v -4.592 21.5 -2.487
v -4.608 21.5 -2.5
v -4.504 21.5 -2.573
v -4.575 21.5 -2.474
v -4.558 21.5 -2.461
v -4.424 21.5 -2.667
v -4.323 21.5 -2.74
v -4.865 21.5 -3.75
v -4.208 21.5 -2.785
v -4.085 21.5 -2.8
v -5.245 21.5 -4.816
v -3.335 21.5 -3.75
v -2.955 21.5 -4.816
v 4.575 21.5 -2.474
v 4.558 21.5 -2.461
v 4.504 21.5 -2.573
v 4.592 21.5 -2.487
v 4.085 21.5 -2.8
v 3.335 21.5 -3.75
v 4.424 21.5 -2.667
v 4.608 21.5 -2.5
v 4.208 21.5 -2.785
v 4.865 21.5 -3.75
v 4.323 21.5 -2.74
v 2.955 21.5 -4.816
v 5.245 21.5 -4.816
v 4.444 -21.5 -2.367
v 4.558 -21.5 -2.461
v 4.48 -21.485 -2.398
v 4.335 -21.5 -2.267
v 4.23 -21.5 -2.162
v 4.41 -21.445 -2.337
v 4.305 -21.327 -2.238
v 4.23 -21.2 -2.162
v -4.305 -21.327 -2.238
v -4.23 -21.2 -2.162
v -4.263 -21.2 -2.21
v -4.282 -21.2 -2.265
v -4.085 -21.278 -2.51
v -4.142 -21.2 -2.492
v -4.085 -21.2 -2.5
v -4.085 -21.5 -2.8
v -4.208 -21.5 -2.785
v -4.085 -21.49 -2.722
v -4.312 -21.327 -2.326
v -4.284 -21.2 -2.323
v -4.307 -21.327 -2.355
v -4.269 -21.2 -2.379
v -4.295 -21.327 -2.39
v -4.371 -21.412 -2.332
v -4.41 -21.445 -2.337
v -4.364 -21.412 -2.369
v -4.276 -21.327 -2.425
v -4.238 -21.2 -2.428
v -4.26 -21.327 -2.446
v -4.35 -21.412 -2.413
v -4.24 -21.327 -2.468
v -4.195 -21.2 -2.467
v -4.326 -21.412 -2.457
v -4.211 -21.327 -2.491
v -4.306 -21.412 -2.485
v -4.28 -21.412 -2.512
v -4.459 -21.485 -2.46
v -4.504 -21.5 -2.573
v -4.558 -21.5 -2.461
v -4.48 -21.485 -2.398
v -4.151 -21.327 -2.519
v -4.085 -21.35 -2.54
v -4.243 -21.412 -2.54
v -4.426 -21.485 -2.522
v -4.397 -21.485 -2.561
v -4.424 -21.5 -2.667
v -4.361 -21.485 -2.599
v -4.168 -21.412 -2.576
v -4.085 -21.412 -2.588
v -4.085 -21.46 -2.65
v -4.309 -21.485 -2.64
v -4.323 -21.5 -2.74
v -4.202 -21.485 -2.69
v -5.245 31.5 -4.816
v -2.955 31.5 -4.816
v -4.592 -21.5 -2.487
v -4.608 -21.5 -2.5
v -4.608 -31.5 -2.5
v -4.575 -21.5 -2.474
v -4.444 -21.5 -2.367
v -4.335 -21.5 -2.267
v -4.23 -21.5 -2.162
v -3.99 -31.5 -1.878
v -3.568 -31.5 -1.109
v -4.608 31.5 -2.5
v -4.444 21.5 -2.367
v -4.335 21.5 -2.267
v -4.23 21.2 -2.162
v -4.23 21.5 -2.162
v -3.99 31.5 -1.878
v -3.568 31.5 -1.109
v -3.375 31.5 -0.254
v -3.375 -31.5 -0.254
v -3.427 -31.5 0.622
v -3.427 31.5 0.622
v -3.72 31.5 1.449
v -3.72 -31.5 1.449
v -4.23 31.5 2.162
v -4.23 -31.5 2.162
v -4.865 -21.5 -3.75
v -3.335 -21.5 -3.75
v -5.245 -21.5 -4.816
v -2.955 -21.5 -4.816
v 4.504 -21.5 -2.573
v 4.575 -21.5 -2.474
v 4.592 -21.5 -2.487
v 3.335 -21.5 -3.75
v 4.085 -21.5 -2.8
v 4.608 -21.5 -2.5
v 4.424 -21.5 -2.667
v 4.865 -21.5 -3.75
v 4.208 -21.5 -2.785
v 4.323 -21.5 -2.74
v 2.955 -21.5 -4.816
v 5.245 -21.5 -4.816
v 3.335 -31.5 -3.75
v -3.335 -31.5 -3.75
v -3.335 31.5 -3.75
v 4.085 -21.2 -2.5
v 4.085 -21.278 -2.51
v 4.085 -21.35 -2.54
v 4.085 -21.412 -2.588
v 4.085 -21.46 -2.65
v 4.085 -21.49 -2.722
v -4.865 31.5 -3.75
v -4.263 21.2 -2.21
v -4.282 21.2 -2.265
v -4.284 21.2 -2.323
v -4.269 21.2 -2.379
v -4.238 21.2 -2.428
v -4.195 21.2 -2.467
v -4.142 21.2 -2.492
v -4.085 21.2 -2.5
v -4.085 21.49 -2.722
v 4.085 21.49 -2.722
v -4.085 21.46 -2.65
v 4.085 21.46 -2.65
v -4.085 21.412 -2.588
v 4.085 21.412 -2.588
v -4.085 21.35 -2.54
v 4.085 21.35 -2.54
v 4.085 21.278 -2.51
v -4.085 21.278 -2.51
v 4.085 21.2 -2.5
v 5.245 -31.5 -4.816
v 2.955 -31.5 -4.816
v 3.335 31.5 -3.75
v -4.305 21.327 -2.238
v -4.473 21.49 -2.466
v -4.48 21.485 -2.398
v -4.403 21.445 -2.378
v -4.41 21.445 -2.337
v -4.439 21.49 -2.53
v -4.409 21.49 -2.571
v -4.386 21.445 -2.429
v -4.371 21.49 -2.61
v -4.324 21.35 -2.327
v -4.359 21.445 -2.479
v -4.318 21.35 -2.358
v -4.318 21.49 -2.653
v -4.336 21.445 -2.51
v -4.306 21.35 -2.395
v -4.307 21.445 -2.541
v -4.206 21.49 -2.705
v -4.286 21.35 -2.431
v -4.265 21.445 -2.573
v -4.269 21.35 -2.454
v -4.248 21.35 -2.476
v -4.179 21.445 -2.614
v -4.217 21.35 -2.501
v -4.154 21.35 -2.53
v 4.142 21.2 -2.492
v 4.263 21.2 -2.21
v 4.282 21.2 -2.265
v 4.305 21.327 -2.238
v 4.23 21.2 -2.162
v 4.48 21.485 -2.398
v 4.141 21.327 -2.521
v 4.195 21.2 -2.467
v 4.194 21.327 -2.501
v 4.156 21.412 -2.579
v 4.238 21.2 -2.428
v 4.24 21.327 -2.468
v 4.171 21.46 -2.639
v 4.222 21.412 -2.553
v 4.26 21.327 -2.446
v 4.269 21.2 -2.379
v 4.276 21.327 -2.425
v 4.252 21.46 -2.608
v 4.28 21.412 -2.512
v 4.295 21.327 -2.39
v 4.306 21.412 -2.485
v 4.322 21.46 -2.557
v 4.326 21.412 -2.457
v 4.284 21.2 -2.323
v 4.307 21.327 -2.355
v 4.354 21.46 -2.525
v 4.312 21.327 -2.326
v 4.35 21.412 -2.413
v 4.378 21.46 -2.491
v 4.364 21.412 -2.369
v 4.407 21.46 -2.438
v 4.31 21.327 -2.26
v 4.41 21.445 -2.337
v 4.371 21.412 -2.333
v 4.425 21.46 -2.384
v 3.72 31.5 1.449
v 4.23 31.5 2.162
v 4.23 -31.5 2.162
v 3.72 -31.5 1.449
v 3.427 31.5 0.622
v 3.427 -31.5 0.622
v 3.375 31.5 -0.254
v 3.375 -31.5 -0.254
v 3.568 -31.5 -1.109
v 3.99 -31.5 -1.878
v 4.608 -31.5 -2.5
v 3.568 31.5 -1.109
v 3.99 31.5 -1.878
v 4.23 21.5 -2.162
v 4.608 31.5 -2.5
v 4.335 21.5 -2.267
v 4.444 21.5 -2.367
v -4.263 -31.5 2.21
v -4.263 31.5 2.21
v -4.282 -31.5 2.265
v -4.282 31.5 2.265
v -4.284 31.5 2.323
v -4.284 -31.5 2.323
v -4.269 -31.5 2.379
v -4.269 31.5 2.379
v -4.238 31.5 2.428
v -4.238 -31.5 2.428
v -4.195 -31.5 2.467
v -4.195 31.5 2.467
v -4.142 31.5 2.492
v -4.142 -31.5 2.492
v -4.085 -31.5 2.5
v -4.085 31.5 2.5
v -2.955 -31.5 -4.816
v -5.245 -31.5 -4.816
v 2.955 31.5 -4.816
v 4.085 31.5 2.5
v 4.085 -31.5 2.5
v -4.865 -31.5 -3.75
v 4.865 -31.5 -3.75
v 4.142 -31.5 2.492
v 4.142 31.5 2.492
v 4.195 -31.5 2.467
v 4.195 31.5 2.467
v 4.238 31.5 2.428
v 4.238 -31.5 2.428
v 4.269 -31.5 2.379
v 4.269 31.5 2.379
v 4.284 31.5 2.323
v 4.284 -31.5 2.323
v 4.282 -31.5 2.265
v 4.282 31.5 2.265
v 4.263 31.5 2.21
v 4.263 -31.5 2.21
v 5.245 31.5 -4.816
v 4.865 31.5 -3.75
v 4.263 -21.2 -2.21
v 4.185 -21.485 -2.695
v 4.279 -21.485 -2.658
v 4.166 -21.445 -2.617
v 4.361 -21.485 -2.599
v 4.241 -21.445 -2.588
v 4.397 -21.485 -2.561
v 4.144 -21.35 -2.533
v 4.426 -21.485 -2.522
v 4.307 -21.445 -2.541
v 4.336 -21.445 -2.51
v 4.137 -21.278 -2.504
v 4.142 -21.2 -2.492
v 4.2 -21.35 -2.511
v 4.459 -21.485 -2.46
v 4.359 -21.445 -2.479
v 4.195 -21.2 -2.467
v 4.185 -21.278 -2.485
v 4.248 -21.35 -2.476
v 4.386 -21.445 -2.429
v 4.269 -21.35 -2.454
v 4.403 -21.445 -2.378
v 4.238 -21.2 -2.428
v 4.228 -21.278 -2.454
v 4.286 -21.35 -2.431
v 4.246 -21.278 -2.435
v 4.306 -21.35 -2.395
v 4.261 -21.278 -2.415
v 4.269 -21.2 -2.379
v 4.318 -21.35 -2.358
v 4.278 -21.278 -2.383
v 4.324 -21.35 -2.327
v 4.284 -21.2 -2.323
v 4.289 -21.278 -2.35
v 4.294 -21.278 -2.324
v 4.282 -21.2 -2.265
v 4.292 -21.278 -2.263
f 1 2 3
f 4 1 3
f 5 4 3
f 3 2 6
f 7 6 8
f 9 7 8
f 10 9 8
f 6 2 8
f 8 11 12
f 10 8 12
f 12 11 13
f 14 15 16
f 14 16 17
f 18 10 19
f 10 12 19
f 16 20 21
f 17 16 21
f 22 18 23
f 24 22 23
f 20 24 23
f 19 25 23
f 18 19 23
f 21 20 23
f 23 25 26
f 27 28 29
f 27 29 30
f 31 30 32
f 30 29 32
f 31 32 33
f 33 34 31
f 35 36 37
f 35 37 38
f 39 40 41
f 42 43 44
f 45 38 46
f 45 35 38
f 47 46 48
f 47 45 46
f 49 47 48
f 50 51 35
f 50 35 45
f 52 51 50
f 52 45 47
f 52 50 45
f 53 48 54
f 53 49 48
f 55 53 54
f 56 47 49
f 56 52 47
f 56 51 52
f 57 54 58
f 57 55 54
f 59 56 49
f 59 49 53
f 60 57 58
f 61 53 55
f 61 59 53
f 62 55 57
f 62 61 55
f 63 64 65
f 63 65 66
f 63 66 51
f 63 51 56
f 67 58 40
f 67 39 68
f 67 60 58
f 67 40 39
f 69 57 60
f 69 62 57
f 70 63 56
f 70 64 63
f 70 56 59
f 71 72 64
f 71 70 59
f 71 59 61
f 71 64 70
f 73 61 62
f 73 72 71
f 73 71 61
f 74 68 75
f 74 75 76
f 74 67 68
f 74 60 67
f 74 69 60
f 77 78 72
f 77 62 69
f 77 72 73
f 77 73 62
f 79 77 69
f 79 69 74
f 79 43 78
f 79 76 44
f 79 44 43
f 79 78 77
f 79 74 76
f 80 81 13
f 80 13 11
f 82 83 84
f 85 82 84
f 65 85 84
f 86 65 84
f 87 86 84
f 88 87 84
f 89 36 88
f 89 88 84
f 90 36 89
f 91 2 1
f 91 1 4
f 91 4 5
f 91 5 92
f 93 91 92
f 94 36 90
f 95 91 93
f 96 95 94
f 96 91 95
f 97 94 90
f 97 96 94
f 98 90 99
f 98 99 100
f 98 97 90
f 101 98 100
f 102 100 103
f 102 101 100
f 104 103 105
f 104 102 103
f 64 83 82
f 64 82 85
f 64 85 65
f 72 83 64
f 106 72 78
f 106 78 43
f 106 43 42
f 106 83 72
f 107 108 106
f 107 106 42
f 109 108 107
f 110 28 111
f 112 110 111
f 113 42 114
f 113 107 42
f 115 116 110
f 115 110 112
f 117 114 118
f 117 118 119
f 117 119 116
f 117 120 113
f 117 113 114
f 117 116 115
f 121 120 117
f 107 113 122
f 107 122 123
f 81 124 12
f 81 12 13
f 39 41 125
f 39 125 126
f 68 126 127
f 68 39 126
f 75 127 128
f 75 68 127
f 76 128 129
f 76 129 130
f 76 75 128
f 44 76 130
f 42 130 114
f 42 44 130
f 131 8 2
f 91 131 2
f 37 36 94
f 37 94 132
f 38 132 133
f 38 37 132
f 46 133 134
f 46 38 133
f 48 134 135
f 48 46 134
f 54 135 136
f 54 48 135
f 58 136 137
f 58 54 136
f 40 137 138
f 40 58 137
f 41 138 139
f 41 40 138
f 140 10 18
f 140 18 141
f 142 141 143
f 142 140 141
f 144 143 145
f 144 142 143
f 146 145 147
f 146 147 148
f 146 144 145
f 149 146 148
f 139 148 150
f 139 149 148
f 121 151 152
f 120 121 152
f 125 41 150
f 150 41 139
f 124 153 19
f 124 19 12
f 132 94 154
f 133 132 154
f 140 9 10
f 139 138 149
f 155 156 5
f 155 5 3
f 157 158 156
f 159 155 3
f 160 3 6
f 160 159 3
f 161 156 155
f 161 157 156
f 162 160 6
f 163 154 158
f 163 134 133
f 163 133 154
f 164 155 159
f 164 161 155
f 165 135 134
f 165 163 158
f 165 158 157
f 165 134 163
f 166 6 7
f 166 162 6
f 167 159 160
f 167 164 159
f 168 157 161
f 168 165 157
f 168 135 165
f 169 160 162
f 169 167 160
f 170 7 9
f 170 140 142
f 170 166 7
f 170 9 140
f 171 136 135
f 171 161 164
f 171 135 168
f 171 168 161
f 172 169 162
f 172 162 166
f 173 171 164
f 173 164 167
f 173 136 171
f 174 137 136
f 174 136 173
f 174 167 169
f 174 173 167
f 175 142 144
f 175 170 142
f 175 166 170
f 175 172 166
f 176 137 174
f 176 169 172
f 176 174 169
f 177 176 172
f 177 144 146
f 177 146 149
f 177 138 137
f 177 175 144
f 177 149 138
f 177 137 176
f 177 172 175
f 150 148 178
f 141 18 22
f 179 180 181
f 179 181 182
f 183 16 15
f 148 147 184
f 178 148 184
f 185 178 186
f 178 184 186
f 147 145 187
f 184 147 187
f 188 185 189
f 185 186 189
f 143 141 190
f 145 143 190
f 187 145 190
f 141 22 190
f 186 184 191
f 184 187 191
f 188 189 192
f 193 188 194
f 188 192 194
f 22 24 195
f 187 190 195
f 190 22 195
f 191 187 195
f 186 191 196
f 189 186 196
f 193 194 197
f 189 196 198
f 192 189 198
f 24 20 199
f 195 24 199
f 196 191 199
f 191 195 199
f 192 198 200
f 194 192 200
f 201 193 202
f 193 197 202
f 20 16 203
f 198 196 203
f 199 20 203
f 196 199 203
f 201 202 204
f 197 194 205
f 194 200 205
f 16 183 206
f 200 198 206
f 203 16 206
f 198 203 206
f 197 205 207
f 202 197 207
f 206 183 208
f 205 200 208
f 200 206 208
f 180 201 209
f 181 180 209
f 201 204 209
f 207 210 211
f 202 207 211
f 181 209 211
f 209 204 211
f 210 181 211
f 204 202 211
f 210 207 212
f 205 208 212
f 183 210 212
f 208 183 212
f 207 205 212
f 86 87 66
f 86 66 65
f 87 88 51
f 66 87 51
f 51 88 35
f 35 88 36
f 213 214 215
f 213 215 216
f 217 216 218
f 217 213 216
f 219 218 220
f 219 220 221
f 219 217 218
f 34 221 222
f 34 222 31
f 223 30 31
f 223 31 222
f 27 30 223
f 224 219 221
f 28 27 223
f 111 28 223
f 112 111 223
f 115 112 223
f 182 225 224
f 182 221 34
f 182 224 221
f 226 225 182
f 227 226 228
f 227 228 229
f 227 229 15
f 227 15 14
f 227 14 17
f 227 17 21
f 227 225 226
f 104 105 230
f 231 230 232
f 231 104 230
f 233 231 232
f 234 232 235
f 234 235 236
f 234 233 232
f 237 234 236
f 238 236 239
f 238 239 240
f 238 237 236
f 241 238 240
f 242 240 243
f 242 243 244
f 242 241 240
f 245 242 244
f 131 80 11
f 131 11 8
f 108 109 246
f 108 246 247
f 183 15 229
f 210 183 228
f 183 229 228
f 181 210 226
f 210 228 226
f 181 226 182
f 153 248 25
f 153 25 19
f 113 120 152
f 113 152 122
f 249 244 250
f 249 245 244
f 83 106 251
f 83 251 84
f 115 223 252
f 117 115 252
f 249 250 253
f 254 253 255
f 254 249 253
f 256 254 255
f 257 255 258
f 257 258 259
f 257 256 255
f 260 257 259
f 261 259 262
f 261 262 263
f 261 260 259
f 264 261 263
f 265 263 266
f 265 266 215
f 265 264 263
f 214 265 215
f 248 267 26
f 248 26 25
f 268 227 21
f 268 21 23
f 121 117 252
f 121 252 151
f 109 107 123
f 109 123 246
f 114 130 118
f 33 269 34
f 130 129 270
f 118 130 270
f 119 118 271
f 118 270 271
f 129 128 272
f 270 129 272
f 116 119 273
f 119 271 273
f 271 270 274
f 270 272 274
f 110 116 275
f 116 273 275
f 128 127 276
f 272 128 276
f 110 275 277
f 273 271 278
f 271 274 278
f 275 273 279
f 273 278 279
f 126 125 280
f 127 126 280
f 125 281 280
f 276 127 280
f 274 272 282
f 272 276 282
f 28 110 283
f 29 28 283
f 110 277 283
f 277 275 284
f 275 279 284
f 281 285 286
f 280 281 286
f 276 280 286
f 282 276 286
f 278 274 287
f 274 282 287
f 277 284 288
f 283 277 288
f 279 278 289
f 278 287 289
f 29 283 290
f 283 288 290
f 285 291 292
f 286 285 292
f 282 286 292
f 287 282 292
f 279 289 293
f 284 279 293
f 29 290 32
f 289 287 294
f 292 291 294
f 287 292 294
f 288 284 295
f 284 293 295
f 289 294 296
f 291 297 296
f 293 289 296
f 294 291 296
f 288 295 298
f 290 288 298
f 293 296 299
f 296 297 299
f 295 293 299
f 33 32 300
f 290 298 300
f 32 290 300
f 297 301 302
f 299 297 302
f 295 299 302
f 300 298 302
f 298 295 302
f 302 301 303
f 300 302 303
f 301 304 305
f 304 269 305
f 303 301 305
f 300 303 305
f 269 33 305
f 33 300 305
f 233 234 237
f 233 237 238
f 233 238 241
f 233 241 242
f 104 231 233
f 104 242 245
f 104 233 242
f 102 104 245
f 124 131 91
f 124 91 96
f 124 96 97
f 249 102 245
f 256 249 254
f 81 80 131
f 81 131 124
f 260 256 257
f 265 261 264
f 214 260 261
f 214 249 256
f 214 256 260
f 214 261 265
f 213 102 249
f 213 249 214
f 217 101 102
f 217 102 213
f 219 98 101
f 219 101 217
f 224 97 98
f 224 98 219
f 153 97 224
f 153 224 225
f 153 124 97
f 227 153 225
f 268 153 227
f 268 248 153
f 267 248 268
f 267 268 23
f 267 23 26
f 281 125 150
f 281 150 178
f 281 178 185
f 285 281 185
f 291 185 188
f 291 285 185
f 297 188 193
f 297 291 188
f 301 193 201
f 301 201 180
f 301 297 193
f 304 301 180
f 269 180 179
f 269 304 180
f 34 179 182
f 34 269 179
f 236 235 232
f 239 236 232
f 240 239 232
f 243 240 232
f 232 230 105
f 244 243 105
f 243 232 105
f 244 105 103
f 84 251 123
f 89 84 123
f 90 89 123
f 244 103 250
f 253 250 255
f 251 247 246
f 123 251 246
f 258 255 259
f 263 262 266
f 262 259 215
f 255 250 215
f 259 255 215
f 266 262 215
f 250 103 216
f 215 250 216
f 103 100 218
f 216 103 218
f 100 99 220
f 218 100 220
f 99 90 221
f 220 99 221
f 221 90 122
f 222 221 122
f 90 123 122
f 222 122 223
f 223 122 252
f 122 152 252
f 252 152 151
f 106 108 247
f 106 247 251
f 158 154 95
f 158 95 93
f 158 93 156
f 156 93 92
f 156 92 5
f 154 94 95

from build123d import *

# Parameters (mm, degrees)
BOSS_EXTRUDE2_DEPTH     = 31.5
CUT_EXTRUDE1_DEPTH      = 33.294824363
CUT_EXTRUDE1_DEPTH_BACK = 33.294824363
SKETCH2_W               = 2.315915901
SKETCH2_H               = 43
CUT_EXTRUDE2_START      = -21.5
CUT_EXTRUDE2_DEPTH      = 43
FILLET1_R               = 0.3


with BuildPart() as part:
    # Sketch1 → Boss-Extrude2 (new, symmetric)
    with BuildSketch(Plane(origin=(0, 0, 0), x_dir=(1, 0, 0), z_dir=(0, 1, 0))):
        with BuildLine():
            Line((-4.085, -2.5), (4.085, -2.5))
            ThreePointArc((4.085, -2.5), (4.268829006, -2.37878386), (4.229827586, -2.162068966))
            ThreePointArc((4.229827586, -2.162068966), (3.375283995, 0.253722072), (4.608380324, 2.5))
            Line((4.608380324, 2.5), (4.864564522, 3.75))
            Line((4.864564522, 3.75), (5.245248772, 4.815915901))
            Line((5.245248772, 4.815915901), (2.954751228, 4.815915901))
            Line((2.954751228, 4.815915901), (3.335435478, 3.75))
            Line((3.335435478, 3.75), (-3.335435478, 3.75))
            Line((-3.335435478, 3.75), (-2.954751228, 4.815915901))
            Line((-2.954751228, 4.815915901), (-5.245248772, 4.815915901))
            Line((-5.245248772, 4.815915901), (-4.864564522, 3.75))
            Line((-4.864564522, 3.75), (-4.608380324, 2.5))
            ThreePointArc((-4.608380324, 2.5), (-3.375283995, 0.253722072), (-4.229827586, -2.162068966))
            ThreePointArc((-4.229827586, -2.162068966), (-4.268829006, -2.37878386), (-4.085, -2.5))
        make_face()
    extrude(amount=BOSS_EXTRUDE2_DEPTH, both=True)

    # Sketch2 → Cut-Extrude1 (cut, two sides: drawn at the far end of the back side and taken through both)
    with BuildSketch(Plane(origin=(0, 0, 0), x_dir=(0, 0, -1), z_dir=(1, 0, 0)).offset(-CUT_EXTRUDE1_DEPTH_BACK)):
        with Locations((3.657957951, 0)):
            Rectangle(SKETCH2_W, SKETCH2_H)
    extrude(amount=CUT_EXTRUDE1_DEPTH + CUT_EXTRUDE1_DEPTH_BACK, mode=Mode.SUBTRACT)

    # Sketch3 → Cut-Extrude2 (cut)
    with BuildSketch(Plane(origin=(0, 0, 0), x_dir=(1, 0, 0), z_dir=(0, 1, 0)).offset(CUT_EXTRUDE2_START)):
        with BuildLine():
            Line((4.608380324, 2.5), (4.085, 2.5))
            ThreePointArc((4.085, 2.5), (4.268829006, 2.37878386), (4.229827586, 2.162068966))
            ThreePointArc((4.229827586, 2.162068966), (4.412255357, 2.338706331), (4.608380324, 2.5))
        make_face()
        with BuildLine():
            Line((-4.085, 2.5), (-4.608380324, 2.5))
            ThreePointArc((-4.608380324, 2.5), (-4.412255357, 2.338706331), (-4.229827586, 2.162068966))
            ThreePointArc((-4.229827586, 2.162068966), (-4.268829006, 2.37878386), (-4.085, 2.5))
        make_face()
    extrude(amount=CUT_EXTRUDE2_DEPTH, mode=Mode.SUBTRACT)

    # Fillet1
    # the kernel refuses this fillet: 0.3 mm, written as the material it adds along each edge
    with BuildSketch(Plane(origin=(-4.085, 21.5, -2.5), x_dir=(0, 0, -1), z_dir=(1, 0, 0))) as fillet1_piece_1:
        with BuildLine():
            CenterArc((FILLET1_R, -FILLET1_R), FILLET1_R, 90, 90)
            Line((0, -FILLET1_R), (0, 0))
            Line((0, 0), (FILLET1_R, 0))
        make_face()
    extrude(amount=8.17)
    with BuildSketch(Plane(origin=(-4.085, -21.5, -2.5), x_dir=(0, 0, -1), z_dir=(1, 0, 0))) as fillet1_piece_2:
        with BuildLine():
            CenterArc((FILLET1_R, FILLET1_R), FILLET1_R, 180, 90)
            Line((0, FILLET1_R), (0, 0))
            Line((0, 0), (FILLET1_R, 0))
        make_face()
    extrude(amount=8.17)
    with BuildSketch(Plane(origin=(4.085, -21.5, -2.3), x_dir=(0, 0, -1), z_dir=(-1, 0, 0))) as fillet1_piece_3_section:
        with BuildLine():
            CenterArc((0.2 + FILLET1_R, -FILLET1_R), FILLET1_R, 90, 90)
            Line((0.2 + FILLET1_R, 0), (0.2, 0))
            Line((0.2, 0), (0.2, -FILLET1_R))
        make_face()
    fillet1_piece_3 = revolve(axis=Axis((4.085, -21.5, -2.3), (0, -1, 0)), revolution_arc=348.652256653, mode=Mode.PRIVATE)
    fillet1_piece_3 = fillet1_piece_3 - Plane(origin=(6.5, -21.422221686, 0), x_dir=(-0.7241379310344833, 0, 0.6896551724137925), z_dir=(0, 1, 0)) * Cylinder(3.135, 3, mode=Mode.PRIVATE)
    add(fillet1_piece_3)
    with BuildSketch(Plane(origin=(4.085, 21.5, -2.3), x_dir=(0, 0, -1), z_dir=(-1, 0, 0))) as fillet1_piece_4_section:
        with BuildLine():
            CenterArc((0.2 + FILLET1_R, FILLET1_R), FILLET1_R, 180, 90)
            Line((0.2, FILLET1_R), (0.2, 0))
            Line((0.2, 0), (0.2 + FILLET1_R, 0))
        make_face()
    fillet1_piece_4 = revolve(axis=Axis((4.085, 21.5, -2.3), (0, -1, 0)), revolution_arc=348.652256653, mode=Mode.PRIVATE)
    fillet1_piece_4 = fillet1_piece_4 - Plane(origin=(6.5, 21.453136738, 0), x_dir=(-0.7241379310344833, 0, 0.6896551724137925), z_dir=(0, 1, 0)) * Cylinder(3.135, 3, mode=Mode.PRIVATE)
    add(fillet1_piece_4)
    with BuildSketch(Plane(origin=(-4.085, -21.5, -2.3), x_dir=(0.19676320132500988, 0, -0.9804510403912751), z_dir=(-0.9804510403912751, 0, -0.19676320132500988))) as fillet1_piece_5_section:
        with BuildLine():
            CenterArc((-0.2 - FILLET1_R, -FILLET1_R), FILLET1_R, 0, 90)
            Line((-0.2, -FILLET1_R), (-0.2, 0))
            Line((-0.2, 0), (-0.2 - FILLET1_R, 0))
        make_face()
    fillet1_piece_5 = revolve(axis=Axis((-4.085, -21.5, -2.3), (0, -1, 0)), revolution_arc=348.652256653, mode=Mode.PRIVATE)
    fillet1_piece_5 = fillet1_piece_5 - Plane(origin=(-6.5, -21.422220157, 0), x_dir=(0.6033874565748113, 0, -0.7974481658692183), z_dir=(0, 1, 0)) * Cylinder(3.135, 2, mode=Mode.PRIVATE)
    add(fillet1_piece_5)
    with BuildSketch(Plane(origin=(-4.085, 21.5, -2.3), x_dir=(0.1967632013250235, 0, -0.9804510403912723), z_dir=(-0.9804510403912723, 0, -0.1967632013250235))) as fillet1_piece_6_section:
        with BuildLine():
            CenterArc((-0.2 - FILLET1_R, FILLET1_R), FILLET1_R, 270, 90)
            Line((-0.2, FILLET1_R), (-0.2, 0))
            Line((-0.2, 0), (-0.2 - FILLET1_R, 0))
        make_face()
    fillet1_piece_6 = revolve(axis=Axis((-4.085, 21.5, -2.3), (0, -1, 0)), revolution_arc=348.652256653, mode=Mode.PRIVATE)
    fillet1_piece_6 = fillet1_piece_6 - Plane(origin=(-6.5, 21.422220134, 0), x_dir=(0.6033874565748113, 0, -0.7974481658692183), z_dir=(0, 1, 0)) * Cylinder(3.135, 2, mode=Mode.PRIVATE)
    add(fillet1_piece_6)


solid = part.part
